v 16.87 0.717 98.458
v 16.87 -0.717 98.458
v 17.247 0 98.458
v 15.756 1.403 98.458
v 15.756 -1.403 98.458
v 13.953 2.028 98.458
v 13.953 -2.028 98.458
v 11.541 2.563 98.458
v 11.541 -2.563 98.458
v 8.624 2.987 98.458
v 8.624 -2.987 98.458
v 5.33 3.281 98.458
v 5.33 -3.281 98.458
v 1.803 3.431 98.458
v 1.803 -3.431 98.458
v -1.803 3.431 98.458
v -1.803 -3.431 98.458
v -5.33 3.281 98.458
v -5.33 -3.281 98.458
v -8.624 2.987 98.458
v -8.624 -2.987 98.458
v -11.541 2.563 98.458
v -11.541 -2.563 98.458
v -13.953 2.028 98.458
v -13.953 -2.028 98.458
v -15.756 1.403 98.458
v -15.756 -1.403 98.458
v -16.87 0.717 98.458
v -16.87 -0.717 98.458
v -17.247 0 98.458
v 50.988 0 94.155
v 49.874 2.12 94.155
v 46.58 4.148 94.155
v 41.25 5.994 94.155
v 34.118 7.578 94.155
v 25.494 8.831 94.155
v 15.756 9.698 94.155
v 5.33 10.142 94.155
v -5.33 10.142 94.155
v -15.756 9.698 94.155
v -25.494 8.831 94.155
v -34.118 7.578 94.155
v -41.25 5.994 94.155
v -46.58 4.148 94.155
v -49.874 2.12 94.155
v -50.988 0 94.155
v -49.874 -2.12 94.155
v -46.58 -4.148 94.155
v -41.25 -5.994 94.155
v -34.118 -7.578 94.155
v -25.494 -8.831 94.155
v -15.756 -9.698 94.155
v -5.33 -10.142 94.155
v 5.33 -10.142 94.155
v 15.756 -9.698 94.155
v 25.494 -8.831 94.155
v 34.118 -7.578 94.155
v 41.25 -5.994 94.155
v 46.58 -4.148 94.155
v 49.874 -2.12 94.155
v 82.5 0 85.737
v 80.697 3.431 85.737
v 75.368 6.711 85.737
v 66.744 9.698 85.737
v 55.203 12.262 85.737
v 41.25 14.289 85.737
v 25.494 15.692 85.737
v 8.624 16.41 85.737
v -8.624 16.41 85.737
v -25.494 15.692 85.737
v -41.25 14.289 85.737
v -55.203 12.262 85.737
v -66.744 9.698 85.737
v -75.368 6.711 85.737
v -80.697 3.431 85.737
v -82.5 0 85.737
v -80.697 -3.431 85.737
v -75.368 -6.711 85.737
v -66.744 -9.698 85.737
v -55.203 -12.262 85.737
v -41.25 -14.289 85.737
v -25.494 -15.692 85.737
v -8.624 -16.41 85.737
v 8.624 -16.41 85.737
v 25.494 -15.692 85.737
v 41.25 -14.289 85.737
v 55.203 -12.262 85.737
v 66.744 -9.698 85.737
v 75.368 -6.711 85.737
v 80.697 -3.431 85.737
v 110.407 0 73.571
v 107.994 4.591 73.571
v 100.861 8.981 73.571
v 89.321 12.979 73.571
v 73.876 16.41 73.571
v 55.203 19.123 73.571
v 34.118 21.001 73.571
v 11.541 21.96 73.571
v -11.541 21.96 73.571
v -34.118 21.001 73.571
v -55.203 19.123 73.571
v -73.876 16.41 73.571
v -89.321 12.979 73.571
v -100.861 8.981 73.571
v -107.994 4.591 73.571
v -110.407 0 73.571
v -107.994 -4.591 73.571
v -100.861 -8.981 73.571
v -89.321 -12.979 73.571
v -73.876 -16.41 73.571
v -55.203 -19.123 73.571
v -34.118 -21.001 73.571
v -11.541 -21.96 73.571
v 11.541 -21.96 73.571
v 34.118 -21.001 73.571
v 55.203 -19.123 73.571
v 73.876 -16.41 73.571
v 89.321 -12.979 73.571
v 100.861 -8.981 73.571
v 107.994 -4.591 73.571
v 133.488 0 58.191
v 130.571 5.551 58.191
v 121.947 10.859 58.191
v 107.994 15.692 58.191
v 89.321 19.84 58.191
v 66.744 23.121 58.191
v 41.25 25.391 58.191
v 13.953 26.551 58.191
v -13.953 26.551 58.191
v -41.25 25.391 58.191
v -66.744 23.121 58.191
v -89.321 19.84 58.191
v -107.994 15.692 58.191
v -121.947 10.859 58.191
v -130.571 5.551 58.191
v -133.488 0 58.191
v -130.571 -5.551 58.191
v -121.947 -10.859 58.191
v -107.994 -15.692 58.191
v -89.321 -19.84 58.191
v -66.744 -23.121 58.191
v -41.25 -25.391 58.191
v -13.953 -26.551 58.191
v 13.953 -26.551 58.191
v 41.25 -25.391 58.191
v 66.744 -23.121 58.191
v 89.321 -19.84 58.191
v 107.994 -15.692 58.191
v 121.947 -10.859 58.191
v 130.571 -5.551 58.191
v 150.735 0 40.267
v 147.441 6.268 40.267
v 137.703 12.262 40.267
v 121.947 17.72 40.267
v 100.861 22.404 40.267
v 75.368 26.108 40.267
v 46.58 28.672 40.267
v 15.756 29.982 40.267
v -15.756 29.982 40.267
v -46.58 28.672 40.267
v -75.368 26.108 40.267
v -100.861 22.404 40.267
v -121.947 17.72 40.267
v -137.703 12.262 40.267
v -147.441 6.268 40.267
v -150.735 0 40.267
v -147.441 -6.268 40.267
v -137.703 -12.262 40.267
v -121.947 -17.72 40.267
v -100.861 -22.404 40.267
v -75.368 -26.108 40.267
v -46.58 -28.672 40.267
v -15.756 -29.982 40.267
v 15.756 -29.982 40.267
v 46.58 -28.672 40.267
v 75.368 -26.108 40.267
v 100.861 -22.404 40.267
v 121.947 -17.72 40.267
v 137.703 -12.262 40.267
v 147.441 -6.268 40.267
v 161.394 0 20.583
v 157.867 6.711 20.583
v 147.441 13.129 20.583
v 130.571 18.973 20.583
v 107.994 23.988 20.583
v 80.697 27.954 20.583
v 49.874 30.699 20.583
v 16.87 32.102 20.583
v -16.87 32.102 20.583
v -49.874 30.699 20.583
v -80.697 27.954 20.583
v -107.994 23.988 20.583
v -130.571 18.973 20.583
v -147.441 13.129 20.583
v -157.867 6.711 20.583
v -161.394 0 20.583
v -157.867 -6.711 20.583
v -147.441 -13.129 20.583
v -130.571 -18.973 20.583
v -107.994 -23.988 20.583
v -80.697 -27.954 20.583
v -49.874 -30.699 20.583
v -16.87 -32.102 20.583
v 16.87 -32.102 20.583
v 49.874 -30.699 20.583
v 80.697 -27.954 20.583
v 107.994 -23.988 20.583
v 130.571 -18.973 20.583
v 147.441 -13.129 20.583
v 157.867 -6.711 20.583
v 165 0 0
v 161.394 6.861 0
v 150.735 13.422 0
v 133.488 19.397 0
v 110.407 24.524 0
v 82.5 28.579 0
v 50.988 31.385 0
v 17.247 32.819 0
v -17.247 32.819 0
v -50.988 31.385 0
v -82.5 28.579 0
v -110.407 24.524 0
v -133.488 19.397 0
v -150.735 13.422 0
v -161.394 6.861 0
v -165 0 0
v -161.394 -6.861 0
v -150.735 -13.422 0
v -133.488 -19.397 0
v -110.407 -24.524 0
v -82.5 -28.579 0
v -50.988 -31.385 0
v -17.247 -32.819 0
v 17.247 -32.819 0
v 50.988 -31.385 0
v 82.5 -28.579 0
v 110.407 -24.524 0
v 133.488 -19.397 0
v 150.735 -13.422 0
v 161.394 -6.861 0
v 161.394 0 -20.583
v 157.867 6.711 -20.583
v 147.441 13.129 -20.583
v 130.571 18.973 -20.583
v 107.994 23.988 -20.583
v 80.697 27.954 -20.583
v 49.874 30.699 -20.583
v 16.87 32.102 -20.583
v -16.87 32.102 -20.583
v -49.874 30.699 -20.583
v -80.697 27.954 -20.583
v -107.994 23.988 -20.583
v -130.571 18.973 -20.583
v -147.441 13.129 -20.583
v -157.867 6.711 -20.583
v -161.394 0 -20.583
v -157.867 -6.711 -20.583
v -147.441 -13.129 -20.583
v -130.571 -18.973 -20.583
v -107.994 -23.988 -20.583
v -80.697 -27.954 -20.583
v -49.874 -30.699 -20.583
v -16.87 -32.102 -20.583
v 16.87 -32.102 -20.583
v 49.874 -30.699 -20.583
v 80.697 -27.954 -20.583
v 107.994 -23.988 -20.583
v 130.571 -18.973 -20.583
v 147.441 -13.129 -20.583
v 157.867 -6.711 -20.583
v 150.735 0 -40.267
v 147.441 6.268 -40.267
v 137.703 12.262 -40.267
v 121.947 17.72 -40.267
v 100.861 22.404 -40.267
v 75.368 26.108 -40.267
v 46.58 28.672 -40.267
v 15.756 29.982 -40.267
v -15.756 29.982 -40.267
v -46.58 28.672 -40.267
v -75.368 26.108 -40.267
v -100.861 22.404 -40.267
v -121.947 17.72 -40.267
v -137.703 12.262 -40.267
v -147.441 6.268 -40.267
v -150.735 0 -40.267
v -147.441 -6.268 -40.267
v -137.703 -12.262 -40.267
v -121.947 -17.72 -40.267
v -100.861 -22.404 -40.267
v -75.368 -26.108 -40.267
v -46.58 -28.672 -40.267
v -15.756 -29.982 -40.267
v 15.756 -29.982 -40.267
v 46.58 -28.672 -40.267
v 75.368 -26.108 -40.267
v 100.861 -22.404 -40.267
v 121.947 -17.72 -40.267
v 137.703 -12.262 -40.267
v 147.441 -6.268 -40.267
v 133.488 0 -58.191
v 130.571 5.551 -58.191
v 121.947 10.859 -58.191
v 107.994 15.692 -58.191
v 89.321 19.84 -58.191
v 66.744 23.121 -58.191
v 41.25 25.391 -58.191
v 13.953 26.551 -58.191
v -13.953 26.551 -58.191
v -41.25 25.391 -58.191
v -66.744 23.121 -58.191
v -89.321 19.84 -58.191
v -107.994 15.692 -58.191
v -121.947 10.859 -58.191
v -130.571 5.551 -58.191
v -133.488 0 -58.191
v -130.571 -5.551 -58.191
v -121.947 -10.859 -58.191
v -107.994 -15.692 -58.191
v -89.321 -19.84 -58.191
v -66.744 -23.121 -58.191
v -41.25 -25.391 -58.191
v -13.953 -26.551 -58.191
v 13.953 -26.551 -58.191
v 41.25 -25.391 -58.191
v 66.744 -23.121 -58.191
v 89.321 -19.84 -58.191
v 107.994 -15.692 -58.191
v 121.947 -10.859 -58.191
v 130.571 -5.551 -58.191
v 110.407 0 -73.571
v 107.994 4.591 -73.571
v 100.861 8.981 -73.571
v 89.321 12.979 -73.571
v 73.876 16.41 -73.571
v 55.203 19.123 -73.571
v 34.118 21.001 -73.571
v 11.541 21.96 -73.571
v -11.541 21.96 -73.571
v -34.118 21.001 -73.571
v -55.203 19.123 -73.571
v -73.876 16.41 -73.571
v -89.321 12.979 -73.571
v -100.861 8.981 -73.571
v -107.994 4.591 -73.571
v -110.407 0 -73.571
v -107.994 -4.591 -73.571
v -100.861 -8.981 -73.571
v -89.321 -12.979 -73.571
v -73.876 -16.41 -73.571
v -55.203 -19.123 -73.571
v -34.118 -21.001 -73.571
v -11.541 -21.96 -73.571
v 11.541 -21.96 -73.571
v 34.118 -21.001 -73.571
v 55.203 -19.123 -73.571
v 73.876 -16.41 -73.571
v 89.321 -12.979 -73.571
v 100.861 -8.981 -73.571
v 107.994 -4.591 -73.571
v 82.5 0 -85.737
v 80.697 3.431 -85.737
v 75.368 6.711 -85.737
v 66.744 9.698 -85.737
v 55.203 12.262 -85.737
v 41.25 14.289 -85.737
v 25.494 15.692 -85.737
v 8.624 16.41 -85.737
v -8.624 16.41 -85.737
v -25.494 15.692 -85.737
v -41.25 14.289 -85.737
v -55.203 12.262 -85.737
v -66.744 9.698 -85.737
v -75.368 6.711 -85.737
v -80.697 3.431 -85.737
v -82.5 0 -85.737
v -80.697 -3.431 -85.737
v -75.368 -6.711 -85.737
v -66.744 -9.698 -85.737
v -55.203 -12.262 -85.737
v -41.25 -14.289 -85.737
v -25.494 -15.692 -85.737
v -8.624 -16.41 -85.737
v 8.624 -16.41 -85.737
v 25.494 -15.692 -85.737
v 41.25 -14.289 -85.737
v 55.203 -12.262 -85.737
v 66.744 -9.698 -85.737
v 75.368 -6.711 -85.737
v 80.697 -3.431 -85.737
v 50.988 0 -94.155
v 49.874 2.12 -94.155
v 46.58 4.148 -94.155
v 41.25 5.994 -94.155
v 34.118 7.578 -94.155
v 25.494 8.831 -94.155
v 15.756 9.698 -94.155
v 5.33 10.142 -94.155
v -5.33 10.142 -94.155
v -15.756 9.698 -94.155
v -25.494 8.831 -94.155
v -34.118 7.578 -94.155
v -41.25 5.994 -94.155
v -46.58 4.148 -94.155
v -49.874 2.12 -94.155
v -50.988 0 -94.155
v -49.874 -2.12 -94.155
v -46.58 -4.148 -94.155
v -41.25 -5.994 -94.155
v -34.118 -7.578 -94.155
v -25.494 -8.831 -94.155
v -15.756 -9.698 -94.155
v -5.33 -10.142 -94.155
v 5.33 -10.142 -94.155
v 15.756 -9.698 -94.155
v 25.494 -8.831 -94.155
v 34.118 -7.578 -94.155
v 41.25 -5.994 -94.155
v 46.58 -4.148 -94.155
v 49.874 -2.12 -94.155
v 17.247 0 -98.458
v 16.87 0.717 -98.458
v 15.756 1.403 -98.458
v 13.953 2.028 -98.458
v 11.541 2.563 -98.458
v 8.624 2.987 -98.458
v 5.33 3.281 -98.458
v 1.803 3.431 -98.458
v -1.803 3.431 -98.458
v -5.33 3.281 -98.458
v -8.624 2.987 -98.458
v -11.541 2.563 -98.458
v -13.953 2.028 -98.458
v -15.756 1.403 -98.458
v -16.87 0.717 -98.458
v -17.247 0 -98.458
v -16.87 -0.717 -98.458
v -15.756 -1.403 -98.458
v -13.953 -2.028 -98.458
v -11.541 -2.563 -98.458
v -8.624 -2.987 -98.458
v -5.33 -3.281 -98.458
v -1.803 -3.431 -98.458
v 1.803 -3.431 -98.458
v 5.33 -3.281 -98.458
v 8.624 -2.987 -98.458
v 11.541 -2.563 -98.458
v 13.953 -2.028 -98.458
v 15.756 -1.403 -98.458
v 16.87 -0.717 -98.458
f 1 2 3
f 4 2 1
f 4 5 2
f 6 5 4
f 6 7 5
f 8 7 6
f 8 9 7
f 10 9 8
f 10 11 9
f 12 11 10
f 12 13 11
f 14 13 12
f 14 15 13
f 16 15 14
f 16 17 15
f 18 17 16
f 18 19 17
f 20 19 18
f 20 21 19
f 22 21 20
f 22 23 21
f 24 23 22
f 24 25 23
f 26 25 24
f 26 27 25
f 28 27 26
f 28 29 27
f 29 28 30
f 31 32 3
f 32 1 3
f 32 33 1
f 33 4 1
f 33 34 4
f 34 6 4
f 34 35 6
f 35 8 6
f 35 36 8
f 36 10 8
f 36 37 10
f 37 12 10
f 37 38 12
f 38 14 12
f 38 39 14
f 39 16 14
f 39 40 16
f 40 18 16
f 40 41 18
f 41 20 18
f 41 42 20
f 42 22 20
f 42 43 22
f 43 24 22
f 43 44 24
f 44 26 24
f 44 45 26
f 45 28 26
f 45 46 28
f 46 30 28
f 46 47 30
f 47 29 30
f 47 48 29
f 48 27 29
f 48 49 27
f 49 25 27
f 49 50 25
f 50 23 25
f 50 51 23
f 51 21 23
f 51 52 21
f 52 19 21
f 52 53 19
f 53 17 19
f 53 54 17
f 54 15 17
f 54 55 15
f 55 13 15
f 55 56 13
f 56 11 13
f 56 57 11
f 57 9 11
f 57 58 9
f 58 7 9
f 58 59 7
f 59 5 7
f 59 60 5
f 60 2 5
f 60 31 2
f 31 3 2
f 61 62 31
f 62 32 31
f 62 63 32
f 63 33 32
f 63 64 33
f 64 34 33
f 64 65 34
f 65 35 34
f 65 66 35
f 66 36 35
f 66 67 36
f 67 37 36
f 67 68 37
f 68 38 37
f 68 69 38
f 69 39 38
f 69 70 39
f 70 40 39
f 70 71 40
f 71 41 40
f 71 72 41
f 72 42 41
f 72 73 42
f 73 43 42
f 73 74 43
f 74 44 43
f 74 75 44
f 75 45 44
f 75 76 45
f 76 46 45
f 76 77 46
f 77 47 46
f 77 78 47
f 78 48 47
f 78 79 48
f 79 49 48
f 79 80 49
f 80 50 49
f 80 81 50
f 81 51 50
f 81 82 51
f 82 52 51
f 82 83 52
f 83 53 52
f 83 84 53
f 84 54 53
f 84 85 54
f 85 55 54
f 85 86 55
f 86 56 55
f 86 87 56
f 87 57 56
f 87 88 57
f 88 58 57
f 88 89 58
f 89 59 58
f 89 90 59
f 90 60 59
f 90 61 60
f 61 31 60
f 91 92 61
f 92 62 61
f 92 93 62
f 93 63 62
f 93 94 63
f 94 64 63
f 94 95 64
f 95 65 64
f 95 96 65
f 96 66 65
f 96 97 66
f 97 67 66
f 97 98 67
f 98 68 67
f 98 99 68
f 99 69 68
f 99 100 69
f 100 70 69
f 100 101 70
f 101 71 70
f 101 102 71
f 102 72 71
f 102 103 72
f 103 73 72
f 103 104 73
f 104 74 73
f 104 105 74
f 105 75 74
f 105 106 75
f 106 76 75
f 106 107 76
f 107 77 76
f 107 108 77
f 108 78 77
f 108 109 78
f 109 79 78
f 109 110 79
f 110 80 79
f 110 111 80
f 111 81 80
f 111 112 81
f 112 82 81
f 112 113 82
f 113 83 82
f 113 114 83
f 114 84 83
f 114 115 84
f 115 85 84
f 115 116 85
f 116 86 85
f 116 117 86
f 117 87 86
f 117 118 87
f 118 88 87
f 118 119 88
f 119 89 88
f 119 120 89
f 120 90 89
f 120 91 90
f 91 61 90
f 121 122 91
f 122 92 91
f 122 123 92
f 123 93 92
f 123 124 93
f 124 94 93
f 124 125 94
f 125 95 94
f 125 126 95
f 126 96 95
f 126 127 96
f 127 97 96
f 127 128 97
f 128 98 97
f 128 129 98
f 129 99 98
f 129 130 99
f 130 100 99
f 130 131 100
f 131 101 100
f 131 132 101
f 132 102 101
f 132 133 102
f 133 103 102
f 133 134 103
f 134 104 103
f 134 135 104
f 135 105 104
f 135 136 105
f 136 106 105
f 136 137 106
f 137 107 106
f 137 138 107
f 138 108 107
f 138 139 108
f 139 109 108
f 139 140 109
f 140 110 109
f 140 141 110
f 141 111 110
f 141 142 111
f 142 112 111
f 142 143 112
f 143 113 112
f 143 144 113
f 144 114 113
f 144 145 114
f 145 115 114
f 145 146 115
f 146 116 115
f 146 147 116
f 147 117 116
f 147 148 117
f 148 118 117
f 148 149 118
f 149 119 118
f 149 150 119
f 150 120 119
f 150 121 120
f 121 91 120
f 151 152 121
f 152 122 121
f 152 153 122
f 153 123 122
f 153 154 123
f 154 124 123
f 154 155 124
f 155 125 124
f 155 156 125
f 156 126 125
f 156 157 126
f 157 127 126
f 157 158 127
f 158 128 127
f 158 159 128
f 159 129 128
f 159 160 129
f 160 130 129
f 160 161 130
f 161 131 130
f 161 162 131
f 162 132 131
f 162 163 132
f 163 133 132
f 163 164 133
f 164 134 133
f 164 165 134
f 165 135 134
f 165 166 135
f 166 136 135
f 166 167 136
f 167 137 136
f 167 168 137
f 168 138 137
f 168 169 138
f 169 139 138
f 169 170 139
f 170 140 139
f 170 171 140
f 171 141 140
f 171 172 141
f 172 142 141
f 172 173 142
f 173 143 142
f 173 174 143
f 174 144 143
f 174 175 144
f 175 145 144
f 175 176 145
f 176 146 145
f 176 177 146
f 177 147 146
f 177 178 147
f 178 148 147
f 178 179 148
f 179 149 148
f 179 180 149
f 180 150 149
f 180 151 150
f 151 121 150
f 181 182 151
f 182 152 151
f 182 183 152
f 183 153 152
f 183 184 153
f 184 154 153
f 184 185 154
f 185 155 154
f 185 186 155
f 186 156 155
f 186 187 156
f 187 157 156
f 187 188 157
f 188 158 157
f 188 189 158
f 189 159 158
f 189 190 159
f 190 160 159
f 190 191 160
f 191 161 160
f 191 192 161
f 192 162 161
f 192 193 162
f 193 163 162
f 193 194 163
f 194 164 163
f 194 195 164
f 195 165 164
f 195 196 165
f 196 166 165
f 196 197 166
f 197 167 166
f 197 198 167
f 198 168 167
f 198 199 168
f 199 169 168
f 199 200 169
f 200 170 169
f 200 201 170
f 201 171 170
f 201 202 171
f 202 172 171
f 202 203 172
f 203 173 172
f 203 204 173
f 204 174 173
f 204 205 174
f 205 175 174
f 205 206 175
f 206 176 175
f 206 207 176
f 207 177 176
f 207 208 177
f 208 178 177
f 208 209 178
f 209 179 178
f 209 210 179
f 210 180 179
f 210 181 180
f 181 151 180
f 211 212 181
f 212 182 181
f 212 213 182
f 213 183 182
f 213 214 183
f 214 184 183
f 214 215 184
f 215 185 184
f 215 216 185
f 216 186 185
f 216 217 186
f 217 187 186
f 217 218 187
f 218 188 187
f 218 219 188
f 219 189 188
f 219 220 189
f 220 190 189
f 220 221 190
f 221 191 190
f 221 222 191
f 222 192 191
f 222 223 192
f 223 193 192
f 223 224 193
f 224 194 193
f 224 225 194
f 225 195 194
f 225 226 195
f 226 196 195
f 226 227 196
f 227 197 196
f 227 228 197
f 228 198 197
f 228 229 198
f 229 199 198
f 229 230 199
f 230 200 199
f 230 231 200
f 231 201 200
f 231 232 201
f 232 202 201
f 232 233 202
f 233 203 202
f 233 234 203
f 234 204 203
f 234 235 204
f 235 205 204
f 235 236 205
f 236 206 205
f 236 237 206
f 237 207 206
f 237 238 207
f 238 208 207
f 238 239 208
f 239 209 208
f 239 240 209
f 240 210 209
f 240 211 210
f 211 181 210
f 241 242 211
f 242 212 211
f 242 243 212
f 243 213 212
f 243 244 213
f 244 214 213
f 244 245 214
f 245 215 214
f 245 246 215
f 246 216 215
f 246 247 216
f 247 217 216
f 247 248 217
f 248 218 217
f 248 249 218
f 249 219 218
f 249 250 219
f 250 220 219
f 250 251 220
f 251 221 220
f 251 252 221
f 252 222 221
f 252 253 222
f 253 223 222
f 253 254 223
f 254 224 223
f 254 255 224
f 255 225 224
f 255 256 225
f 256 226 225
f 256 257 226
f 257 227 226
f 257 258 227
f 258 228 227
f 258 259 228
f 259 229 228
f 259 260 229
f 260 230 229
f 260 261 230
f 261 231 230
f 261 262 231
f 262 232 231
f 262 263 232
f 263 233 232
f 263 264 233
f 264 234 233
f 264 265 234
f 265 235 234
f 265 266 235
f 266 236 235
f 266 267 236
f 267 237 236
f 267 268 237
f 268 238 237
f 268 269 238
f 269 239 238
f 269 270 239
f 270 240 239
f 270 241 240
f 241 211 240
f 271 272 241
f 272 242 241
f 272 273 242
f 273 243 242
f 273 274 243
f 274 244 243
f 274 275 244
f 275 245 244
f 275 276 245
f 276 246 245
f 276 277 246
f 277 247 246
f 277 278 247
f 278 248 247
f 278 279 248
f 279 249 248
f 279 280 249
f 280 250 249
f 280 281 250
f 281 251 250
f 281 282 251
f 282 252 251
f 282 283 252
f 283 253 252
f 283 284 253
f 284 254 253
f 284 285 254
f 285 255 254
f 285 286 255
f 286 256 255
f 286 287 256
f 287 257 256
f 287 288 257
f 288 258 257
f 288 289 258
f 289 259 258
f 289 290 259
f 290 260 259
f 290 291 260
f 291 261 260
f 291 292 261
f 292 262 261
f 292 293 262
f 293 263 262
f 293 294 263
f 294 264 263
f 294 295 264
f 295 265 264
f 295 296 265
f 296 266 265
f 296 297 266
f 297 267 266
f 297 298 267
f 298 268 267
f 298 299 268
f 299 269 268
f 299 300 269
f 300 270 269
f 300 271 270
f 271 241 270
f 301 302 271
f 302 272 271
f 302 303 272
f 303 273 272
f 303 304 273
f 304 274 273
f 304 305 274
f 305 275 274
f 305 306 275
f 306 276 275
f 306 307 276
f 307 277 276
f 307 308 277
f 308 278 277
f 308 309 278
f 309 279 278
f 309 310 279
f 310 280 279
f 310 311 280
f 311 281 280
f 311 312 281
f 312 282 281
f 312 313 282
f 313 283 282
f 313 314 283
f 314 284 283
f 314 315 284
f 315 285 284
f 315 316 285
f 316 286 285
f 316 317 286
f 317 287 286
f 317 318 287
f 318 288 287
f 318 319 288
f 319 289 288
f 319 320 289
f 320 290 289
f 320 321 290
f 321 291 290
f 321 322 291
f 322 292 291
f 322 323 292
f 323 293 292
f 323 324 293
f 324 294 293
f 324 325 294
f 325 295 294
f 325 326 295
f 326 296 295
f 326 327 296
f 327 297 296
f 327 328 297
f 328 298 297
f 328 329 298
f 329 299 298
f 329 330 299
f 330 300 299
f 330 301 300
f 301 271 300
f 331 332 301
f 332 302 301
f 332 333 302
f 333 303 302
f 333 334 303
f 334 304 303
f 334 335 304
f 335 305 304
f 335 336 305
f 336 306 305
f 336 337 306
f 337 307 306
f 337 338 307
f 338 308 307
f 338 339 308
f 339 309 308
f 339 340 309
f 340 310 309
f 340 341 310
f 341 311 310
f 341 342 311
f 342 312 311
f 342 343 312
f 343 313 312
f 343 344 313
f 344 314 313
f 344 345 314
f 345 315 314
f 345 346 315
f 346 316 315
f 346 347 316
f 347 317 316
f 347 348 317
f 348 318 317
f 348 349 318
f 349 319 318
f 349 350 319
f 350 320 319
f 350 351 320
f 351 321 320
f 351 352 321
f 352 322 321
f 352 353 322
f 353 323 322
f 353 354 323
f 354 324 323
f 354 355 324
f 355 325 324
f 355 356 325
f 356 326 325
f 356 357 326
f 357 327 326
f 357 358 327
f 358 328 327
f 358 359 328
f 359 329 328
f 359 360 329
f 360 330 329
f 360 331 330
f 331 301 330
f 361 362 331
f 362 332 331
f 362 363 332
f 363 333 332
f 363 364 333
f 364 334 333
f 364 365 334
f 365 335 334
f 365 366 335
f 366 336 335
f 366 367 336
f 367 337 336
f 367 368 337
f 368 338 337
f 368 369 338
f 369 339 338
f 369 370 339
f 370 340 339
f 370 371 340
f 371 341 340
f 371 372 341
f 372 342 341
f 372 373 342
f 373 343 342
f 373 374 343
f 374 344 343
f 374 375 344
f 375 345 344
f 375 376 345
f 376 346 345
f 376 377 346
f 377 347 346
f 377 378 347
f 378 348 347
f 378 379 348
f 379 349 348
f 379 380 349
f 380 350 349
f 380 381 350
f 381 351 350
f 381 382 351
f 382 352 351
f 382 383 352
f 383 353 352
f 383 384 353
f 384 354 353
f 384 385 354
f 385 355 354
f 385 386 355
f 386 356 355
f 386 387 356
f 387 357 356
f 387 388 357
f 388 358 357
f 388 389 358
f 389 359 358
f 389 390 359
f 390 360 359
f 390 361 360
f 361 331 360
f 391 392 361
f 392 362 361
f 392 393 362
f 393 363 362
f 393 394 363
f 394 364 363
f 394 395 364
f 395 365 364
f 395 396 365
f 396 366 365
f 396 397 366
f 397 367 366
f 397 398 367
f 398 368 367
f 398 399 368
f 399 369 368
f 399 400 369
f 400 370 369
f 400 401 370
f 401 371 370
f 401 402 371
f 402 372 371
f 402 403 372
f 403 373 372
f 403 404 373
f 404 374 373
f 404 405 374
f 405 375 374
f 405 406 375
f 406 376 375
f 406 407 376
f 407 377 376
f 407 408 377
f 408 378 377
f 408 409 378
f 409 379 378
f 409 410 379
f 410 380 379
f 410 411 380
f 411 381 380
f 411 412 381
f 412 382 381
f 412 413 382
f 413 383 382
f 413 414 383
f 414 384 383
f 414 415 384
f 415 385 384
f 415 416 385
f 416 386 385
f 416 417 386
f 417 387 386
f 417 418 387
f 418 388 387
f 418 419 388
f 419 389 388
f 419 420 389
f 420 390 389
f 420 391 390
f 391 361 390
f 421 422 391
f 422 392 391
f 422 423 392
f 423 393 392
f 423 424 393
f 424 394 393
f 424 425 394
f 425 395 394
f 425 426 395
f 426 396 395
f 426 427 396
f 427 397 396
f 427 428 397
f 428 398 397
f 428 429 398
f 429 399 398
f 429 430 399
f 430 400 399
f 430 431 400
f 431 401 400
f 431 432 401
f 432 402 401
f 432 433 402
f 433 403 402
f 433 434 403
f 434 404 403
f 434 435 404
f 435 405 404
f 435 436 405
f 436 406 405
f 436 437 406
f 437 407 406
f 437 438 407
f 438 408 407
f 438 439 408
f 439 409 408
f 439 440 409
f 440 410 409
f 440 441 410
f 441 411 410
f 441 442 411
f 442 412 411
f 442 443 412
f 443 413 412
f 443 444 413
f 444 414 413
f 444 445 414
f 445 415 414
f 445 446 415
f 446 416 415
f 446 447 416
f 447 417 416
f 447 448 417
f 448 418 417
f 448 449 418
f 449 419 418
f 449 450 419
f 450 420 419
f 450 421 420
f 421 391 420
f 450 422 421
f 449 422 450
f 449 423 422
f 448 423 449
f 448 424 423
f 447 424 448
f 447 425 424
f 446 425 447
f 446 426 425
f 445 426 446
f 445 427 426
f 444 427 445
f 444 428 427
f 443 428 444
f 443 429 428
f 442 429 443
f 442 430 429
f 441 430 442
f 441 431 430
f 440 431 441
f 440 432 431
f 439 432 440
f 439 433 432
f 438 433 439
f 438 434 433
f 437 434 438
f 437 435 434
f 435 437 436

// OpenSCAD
// Generated by SolidPython 1.0.1 on 2020-07-29 00:46:51


scale(v = [15, 3, 9]) {
	sphere(r = 11);
}
/***********************************************
*********      SolidPython code:      **********
************************************************
 
# import packages: SolidPython
from solid import *
from solid.utils import *
from itertools import chain, combinations, permutations


class Resize:

    def __init__(self, scad_file):
        self.scad_file = scad_file
        #self.scad_file = import_scad(scad_file)
        # cone/cylinder param:
        self.r1 = 0
        self.r2 = 0
        self.h = 0
        # rectangular prism param:
        self.w = 0
        self.l = 0
        # ellipse param:
        self.r = 0

    # import OpenScad code (file name corresponds to shape)


    # classify shape + parameters
    def assign(self, param1, param2, param3):
        if self.scad_file == 'cone.scad':
            self.r1 = param1
            self.r2 = param2
            self.h = param3
        elif self.scad_file == 'cylinder.scad':
            self.r1 = param1
            self.r2 = param2
            self.h = param3
        elif self.scad_file == 'rectangularPrism.scad':
            self.h = param1
            self.l = param2
            self.w = param3
        else:
            self.r = param1
            self.h = param2

    # resize parameters
    def iterate(self):
        x = range(3, 20, 2)
        i = 1
        if self.scad_file == 'cone.scad':
            tempList = list(permutations(x, 2))
            for temp in tempList:
                param1 = temp[0]
                param2 = temp[1]
                filepath = 'produced_scad_files/' + 'cone' + str(param1) + '_' + str(param2) + '_' + '.scad'
                scad_render_to_file(cylinder(h=param1, r1=param2, r2=0), filepath)

        elif self.scad_file == 'cylinder.scad':
            tempList = list(permutations(x, 3))
            for temp in tempList:
                param1 = temp[0]
                param2 = temp[1]
                filepath = 'produced_scad_files/' + 'cylinder' + str(param1) + '_' + str(param2) + '_' + '.scad'
                scad_render_to_file(cylinder(h=param1, r1=param2, r2=param2), filepath)

        elif self.scad_file == 'rectangularPrism.scad':
            tempList = list(permutations(x, 3))
            for temp in tempList:
                param1 = temp[0]
                param2 = temp[1]
                param3 = temp[2]
                filepath = 'produced_scad_files/' + 'rectangularPrism' + str(param1) + '_' + str(param2) + '_' + str(
                    param3) + '.scad'
                scad_render_to_file(cube(size=(param1, param2, param3)), filepath)

        elif self.scad_file == 'ellipse.scad':
            tempList = list(permutations(x, 4))
            for temp in tempList:
                param1 = temp[0]
                param2 = temp[1]
                param3 = temp[2]
                param4 = temp[3]
                filepath = 'produced_scad_files/' + 'ellipse' + str(param1) + '_' + str(param2) + '_' + str(param3) + '_' + str(param4) + '.scad'
                scad_render_to_file(scale([param1, param2, param3])(sphere(r=param4)), filepath)

    def render_to_scadfile(self):
        scad_render_to_file(scad, 'example.scad') 
 
************************************************/
